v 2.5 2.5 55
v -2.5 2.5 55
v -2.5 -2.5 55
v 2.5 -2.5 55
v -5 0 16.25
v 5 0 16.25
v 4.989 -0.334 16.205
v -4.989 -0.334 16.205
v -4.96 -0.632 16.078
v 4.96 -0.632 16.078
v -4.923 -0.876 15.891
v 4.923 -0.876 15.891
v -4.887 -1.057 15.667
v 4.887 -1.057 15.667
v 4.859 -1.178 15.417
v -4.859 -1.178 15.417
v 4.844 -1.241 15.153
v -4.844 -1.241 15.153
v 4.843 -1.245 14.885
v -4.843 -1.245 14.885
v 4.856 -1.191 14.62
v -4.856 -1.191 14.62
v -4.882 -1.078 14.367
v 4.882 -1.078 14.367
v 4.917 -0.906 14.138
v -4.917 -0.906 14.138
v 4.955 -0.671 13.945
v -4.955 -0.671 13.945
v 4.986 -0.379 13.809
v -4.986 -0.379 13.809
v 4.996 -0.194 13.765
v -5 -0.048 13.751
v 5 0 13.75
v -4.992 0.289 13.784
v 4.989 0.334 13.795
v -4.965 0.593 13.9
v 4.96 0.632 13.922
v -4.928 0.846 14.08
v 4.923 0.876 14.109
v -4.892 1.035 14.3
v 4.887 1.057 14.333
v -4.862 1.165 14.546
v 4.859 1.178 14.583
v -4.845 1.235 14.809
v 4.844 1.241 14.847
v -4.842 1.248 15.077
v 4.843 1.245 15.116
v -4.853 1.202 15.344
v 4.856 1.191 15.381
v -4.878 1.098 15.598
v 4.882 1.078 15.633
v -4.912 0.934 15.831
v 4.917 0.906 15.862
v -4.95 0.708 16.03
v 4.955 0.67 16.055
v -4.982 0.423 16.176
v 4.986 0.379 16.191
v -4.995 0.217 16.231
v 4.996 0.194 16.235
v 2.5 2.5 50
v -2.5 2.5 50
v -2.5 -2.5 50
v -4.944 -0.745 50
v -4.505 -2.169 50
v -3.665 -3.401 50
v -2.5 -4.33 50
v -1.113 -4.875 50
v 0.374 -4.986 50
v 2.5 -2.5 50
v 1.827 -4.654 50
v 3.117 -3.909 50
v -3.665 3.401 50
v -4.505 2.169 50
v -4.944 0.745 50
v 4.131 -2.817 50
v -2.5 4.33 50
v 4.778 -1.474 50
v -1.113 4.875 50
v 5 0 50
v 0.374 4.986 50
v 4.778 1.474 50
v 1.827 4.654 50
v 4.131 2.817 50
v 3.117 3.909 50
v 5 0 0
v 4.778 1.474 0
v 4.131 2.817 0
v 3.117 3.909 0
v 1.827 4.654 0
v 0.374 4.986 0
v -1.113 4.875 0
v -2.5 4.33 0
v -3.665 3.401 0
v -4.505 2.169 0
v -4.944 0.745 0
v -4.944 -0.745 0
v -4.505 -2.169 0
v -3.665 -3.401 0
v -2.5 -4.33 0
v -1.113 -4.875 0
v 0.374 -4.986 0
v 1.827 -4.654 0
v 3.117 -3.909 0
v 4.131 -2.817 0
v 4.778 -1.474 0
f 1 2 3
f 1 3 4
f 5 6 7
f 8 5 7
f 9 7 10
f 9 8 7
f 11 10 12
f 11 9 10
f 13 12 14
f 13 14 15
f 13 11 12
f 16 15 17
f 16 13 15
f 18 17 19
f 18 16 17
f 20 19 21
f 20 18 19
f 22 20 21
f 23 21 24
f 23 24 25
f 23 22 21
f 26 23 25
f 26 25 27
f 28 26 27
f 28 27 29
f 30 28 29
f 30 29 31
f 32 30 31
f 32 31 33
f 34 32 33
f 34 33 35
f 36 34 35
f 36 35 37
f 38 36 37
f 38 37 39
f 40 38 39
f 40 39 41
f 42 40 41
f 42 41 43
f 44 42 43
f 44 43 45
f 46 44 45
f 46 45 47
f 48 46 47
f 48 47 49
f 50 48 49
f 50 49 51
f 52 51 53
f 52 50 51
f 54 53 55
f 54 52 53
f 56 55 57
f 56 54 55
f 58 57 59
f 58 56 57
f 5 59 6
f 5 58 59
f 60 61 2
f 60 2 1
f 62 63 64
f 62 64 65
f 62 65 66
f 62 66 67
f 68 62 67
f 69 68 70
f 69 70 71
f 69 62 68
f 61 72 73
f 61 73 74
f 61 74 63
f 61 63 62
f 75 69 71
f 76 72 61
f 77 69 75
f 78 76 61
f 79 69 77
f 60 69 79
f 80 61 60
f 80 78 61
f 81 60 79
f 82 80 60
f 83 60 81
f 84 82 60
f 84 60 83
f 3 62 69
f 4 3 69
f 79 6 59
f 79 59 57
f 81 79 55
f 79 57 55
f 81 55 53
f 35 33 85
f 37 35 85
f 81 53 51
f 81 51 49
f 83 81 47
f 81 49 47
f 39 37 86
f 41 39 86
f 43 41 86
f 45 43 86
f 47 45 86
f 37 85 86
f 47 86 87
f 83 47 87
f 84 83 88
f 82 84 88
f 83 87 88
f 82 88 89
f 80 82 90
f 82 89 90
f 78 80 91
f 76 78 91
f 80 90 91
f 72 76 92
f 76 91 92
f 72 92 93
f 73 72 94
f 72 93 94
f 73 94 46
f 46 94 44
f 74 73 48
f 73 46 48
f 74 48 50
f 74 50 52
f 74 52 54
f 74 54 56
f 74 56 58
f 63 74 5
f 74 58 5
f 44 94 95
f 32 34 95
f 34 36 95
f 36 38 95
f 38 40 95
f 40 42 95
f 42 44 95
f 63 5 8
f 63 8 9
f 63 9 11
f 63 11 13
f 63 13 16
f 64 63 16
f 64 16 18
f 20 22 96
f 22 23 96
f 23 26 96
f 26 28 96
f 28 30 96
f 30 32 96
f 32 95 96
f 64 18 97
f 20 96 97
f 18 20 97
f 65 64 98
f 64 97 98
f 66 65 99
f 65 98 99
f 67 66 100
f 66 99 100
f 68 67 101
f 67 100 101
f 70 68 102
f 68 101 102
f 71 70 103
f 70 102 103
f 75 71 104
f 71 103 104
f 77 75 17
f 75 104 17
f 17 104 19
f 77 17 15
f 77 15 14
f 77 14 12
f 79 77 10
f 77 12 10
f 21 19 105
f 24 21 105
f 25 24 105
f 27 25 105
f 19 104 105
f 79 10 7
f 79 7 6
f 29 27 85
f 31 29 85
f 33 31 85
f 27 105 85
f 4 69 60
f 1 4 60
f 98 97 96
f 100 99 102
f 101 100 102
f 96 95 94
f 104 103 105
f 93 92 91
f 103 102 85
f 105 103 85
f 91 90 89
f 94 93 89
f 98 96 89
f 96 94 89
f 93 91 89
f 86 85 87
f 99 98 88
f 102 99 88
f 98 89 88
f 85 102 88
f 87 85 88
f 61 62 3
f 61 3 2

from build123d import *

# Parameters (mm, degrees)
SKETCH1_R               = 5
BOSS_EXTRUDE1_DEPTH     = 50
SKETCH2_W               = 5
SKETCH2_H               = 5
BOSS_EXTRUDE2_DEPTH     = 5
CUT_EXTRUDE1_DEPTH      = 5
CUT_EXTRUDE1_DEPTH_BACK = 5
SKETCH5_R               = 1.25


with BuildPart() as part:
    # Sketch1 → Boss-Extrude1 (new body)
    with BuildSketch(Plane.XY):
        Circle(SKETCH1_R)
    extrude(amount=BOSS_EXTRUDE1_DEPTH)

    # Sketch2 → Boss-Extrude2 (add)
    with BuildSketch(Plane.XY.offset(50)):
        Rectangle(SKETCH2_W, SKETCH2_H)
    extrude(amount=BOSS_EXTRUDE2_DEPTH)

    # Sketch5 → Cut-Extrude1 (cut, two sides: drawn at the far end of the back side and taken through both)
    with BuildSketch(Plane(origin=(0, 0, 0), x_dir=(0, 0, -1), z_dir=(1, 0, 0)).offset(-CUT_EXTRUDE1_DEPTH_BACK)):
        with Locations(Location((-15, 0, 0), (0, 0, 180))):
            Circle(SKETCH5_R)
    extrude(amount=CUT_EXTRUDE1_DEPTH + CUT_EXTRUDE1_DEPTH_BACK, mode=Mode.SUBTRACT)


solid = part.part
